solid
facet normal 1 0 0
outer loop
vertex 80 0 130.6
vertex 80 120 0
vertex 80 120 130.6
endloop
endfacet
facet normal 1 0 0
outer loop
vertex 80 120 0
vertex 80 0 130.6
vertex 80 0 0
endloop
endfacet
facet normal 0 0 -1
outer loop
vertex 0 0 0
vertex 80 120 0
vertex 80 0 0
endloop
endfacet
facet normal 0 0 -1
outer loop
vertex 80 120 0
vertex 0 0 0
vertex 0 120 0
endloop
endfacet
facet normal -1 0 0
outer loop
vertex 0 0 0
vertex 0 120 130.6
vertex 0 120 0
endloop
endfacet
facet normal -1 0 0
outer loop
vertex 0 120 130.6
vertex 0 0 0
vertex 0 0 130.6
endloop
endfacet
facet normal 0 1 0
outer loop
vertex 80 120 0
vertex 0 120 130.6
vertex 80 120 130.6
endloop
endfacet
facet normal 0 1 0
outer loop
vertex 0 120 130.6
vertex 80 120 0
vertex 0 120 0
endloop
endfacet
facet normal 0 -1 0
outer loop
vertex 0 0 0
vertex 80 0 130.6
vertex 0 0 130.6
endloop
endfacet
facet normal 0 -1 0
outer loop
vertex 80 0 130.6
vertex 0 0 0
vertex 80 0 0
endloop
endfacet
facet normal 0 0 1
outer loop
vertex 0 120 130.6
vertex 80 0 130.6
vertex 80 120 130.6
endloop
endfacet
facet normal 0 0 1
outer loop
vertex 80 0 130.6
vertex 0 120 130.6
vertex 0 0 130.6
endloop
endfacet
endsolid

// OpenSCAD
// Architectural thermal visualization; dimensions are scaled.
color([0.8574,0,0.1426,0.75]) translate([0,0,0.00000]) cube([80.00000,120.00000,18.00000]);
color([0.9942,0,0.0058,0.75]) translate([0,0,18.00000]) cube([80.00000,120.00000,10.00000]);
color([1.0000,0,0.0000,0.75]) translate([0,0,28.00000]) cube([80.00000,120.00000,10.00000]);
color([0.9541,0,0.0459,0.75]) translate([0,0,38.00000]) cube([80.00000,120.00000,1.50000]);
color([0.9161,0,0.0839,0.75]) translate([0,0,39.50000]) cube([80.00000,120.00000,3.20000]);
color([0.8801,0,0.1199,0.75]) translate([0,0,42.70000]) cube([80.00000,120.00000,1.50000]);
color([0.8442,0,0.1558,0.75]) translate([0,0,44.20000]) cube([80.00000,120.00000,3.20000]);
color([0.8100,0,0.1900,0.75]) translate([0,0,47.40000]) cube([80.00000,120.00000,1.50000]);
color([0.7758,0,0.2242,0.75]) translate([0,0,48.90000]) cube([80.00000,120.00000,3.20000]);
color([0.7431,0,0.2569,0.75]) translate([0,0,52.10000]) cube([80.00000,120.00000,1.50000]);
color([0.7104,0,0.2896,0.75]) translate([0,0,53.60000]) cube([80.00000,120.00000,3.20000]);
color([0.6790,0,0.3210,0.75]) translate([0,0,56.80000]) cube([80.00000,120.00000,1.50000]);
color([0.6476,0,0.3524,0.75]) translate([0,0,58.30000]) cube([80.00000,120.00000,3.20000]);
color([0.6173,0,0.3827,0.75]) translate([0,0,61.50000]) cube([80.00000,120.00000,1.50000]);
color([0.5870,0,0.4130,0.75]) translate([0,0,63.00000]) cube([80.00000,120.00000,3.20000]);
color([0.5576,0,0.4424,0.75]) translate([0,0,66.20000]) cube([80.00000,120.00000,1.50000]);
color([0.5283,0,0.4717,0.75]) translate([0,0,67.70000]) cube([80.00000,120.00000,3.20000]);
color([0.4997,0,0.5003,0.75]) translate([0,0,70.90000]) cube([80.00000,120.00000,1.50000]);
color([0.4712,0,0.5288,0.75]) translate([0,0,72.40000]) cube([80.00000,120.00000,3.20000]);
color([0.3621,0,0.6379,0.75]) translate([0,0,75.60000]) cube([80.00000,120.00000,5.00000]);
color([0.2500,0,0.7500,0.75]) translate([0,0,80.60000]) cube([80.00000,120.00000,50.00000]);
